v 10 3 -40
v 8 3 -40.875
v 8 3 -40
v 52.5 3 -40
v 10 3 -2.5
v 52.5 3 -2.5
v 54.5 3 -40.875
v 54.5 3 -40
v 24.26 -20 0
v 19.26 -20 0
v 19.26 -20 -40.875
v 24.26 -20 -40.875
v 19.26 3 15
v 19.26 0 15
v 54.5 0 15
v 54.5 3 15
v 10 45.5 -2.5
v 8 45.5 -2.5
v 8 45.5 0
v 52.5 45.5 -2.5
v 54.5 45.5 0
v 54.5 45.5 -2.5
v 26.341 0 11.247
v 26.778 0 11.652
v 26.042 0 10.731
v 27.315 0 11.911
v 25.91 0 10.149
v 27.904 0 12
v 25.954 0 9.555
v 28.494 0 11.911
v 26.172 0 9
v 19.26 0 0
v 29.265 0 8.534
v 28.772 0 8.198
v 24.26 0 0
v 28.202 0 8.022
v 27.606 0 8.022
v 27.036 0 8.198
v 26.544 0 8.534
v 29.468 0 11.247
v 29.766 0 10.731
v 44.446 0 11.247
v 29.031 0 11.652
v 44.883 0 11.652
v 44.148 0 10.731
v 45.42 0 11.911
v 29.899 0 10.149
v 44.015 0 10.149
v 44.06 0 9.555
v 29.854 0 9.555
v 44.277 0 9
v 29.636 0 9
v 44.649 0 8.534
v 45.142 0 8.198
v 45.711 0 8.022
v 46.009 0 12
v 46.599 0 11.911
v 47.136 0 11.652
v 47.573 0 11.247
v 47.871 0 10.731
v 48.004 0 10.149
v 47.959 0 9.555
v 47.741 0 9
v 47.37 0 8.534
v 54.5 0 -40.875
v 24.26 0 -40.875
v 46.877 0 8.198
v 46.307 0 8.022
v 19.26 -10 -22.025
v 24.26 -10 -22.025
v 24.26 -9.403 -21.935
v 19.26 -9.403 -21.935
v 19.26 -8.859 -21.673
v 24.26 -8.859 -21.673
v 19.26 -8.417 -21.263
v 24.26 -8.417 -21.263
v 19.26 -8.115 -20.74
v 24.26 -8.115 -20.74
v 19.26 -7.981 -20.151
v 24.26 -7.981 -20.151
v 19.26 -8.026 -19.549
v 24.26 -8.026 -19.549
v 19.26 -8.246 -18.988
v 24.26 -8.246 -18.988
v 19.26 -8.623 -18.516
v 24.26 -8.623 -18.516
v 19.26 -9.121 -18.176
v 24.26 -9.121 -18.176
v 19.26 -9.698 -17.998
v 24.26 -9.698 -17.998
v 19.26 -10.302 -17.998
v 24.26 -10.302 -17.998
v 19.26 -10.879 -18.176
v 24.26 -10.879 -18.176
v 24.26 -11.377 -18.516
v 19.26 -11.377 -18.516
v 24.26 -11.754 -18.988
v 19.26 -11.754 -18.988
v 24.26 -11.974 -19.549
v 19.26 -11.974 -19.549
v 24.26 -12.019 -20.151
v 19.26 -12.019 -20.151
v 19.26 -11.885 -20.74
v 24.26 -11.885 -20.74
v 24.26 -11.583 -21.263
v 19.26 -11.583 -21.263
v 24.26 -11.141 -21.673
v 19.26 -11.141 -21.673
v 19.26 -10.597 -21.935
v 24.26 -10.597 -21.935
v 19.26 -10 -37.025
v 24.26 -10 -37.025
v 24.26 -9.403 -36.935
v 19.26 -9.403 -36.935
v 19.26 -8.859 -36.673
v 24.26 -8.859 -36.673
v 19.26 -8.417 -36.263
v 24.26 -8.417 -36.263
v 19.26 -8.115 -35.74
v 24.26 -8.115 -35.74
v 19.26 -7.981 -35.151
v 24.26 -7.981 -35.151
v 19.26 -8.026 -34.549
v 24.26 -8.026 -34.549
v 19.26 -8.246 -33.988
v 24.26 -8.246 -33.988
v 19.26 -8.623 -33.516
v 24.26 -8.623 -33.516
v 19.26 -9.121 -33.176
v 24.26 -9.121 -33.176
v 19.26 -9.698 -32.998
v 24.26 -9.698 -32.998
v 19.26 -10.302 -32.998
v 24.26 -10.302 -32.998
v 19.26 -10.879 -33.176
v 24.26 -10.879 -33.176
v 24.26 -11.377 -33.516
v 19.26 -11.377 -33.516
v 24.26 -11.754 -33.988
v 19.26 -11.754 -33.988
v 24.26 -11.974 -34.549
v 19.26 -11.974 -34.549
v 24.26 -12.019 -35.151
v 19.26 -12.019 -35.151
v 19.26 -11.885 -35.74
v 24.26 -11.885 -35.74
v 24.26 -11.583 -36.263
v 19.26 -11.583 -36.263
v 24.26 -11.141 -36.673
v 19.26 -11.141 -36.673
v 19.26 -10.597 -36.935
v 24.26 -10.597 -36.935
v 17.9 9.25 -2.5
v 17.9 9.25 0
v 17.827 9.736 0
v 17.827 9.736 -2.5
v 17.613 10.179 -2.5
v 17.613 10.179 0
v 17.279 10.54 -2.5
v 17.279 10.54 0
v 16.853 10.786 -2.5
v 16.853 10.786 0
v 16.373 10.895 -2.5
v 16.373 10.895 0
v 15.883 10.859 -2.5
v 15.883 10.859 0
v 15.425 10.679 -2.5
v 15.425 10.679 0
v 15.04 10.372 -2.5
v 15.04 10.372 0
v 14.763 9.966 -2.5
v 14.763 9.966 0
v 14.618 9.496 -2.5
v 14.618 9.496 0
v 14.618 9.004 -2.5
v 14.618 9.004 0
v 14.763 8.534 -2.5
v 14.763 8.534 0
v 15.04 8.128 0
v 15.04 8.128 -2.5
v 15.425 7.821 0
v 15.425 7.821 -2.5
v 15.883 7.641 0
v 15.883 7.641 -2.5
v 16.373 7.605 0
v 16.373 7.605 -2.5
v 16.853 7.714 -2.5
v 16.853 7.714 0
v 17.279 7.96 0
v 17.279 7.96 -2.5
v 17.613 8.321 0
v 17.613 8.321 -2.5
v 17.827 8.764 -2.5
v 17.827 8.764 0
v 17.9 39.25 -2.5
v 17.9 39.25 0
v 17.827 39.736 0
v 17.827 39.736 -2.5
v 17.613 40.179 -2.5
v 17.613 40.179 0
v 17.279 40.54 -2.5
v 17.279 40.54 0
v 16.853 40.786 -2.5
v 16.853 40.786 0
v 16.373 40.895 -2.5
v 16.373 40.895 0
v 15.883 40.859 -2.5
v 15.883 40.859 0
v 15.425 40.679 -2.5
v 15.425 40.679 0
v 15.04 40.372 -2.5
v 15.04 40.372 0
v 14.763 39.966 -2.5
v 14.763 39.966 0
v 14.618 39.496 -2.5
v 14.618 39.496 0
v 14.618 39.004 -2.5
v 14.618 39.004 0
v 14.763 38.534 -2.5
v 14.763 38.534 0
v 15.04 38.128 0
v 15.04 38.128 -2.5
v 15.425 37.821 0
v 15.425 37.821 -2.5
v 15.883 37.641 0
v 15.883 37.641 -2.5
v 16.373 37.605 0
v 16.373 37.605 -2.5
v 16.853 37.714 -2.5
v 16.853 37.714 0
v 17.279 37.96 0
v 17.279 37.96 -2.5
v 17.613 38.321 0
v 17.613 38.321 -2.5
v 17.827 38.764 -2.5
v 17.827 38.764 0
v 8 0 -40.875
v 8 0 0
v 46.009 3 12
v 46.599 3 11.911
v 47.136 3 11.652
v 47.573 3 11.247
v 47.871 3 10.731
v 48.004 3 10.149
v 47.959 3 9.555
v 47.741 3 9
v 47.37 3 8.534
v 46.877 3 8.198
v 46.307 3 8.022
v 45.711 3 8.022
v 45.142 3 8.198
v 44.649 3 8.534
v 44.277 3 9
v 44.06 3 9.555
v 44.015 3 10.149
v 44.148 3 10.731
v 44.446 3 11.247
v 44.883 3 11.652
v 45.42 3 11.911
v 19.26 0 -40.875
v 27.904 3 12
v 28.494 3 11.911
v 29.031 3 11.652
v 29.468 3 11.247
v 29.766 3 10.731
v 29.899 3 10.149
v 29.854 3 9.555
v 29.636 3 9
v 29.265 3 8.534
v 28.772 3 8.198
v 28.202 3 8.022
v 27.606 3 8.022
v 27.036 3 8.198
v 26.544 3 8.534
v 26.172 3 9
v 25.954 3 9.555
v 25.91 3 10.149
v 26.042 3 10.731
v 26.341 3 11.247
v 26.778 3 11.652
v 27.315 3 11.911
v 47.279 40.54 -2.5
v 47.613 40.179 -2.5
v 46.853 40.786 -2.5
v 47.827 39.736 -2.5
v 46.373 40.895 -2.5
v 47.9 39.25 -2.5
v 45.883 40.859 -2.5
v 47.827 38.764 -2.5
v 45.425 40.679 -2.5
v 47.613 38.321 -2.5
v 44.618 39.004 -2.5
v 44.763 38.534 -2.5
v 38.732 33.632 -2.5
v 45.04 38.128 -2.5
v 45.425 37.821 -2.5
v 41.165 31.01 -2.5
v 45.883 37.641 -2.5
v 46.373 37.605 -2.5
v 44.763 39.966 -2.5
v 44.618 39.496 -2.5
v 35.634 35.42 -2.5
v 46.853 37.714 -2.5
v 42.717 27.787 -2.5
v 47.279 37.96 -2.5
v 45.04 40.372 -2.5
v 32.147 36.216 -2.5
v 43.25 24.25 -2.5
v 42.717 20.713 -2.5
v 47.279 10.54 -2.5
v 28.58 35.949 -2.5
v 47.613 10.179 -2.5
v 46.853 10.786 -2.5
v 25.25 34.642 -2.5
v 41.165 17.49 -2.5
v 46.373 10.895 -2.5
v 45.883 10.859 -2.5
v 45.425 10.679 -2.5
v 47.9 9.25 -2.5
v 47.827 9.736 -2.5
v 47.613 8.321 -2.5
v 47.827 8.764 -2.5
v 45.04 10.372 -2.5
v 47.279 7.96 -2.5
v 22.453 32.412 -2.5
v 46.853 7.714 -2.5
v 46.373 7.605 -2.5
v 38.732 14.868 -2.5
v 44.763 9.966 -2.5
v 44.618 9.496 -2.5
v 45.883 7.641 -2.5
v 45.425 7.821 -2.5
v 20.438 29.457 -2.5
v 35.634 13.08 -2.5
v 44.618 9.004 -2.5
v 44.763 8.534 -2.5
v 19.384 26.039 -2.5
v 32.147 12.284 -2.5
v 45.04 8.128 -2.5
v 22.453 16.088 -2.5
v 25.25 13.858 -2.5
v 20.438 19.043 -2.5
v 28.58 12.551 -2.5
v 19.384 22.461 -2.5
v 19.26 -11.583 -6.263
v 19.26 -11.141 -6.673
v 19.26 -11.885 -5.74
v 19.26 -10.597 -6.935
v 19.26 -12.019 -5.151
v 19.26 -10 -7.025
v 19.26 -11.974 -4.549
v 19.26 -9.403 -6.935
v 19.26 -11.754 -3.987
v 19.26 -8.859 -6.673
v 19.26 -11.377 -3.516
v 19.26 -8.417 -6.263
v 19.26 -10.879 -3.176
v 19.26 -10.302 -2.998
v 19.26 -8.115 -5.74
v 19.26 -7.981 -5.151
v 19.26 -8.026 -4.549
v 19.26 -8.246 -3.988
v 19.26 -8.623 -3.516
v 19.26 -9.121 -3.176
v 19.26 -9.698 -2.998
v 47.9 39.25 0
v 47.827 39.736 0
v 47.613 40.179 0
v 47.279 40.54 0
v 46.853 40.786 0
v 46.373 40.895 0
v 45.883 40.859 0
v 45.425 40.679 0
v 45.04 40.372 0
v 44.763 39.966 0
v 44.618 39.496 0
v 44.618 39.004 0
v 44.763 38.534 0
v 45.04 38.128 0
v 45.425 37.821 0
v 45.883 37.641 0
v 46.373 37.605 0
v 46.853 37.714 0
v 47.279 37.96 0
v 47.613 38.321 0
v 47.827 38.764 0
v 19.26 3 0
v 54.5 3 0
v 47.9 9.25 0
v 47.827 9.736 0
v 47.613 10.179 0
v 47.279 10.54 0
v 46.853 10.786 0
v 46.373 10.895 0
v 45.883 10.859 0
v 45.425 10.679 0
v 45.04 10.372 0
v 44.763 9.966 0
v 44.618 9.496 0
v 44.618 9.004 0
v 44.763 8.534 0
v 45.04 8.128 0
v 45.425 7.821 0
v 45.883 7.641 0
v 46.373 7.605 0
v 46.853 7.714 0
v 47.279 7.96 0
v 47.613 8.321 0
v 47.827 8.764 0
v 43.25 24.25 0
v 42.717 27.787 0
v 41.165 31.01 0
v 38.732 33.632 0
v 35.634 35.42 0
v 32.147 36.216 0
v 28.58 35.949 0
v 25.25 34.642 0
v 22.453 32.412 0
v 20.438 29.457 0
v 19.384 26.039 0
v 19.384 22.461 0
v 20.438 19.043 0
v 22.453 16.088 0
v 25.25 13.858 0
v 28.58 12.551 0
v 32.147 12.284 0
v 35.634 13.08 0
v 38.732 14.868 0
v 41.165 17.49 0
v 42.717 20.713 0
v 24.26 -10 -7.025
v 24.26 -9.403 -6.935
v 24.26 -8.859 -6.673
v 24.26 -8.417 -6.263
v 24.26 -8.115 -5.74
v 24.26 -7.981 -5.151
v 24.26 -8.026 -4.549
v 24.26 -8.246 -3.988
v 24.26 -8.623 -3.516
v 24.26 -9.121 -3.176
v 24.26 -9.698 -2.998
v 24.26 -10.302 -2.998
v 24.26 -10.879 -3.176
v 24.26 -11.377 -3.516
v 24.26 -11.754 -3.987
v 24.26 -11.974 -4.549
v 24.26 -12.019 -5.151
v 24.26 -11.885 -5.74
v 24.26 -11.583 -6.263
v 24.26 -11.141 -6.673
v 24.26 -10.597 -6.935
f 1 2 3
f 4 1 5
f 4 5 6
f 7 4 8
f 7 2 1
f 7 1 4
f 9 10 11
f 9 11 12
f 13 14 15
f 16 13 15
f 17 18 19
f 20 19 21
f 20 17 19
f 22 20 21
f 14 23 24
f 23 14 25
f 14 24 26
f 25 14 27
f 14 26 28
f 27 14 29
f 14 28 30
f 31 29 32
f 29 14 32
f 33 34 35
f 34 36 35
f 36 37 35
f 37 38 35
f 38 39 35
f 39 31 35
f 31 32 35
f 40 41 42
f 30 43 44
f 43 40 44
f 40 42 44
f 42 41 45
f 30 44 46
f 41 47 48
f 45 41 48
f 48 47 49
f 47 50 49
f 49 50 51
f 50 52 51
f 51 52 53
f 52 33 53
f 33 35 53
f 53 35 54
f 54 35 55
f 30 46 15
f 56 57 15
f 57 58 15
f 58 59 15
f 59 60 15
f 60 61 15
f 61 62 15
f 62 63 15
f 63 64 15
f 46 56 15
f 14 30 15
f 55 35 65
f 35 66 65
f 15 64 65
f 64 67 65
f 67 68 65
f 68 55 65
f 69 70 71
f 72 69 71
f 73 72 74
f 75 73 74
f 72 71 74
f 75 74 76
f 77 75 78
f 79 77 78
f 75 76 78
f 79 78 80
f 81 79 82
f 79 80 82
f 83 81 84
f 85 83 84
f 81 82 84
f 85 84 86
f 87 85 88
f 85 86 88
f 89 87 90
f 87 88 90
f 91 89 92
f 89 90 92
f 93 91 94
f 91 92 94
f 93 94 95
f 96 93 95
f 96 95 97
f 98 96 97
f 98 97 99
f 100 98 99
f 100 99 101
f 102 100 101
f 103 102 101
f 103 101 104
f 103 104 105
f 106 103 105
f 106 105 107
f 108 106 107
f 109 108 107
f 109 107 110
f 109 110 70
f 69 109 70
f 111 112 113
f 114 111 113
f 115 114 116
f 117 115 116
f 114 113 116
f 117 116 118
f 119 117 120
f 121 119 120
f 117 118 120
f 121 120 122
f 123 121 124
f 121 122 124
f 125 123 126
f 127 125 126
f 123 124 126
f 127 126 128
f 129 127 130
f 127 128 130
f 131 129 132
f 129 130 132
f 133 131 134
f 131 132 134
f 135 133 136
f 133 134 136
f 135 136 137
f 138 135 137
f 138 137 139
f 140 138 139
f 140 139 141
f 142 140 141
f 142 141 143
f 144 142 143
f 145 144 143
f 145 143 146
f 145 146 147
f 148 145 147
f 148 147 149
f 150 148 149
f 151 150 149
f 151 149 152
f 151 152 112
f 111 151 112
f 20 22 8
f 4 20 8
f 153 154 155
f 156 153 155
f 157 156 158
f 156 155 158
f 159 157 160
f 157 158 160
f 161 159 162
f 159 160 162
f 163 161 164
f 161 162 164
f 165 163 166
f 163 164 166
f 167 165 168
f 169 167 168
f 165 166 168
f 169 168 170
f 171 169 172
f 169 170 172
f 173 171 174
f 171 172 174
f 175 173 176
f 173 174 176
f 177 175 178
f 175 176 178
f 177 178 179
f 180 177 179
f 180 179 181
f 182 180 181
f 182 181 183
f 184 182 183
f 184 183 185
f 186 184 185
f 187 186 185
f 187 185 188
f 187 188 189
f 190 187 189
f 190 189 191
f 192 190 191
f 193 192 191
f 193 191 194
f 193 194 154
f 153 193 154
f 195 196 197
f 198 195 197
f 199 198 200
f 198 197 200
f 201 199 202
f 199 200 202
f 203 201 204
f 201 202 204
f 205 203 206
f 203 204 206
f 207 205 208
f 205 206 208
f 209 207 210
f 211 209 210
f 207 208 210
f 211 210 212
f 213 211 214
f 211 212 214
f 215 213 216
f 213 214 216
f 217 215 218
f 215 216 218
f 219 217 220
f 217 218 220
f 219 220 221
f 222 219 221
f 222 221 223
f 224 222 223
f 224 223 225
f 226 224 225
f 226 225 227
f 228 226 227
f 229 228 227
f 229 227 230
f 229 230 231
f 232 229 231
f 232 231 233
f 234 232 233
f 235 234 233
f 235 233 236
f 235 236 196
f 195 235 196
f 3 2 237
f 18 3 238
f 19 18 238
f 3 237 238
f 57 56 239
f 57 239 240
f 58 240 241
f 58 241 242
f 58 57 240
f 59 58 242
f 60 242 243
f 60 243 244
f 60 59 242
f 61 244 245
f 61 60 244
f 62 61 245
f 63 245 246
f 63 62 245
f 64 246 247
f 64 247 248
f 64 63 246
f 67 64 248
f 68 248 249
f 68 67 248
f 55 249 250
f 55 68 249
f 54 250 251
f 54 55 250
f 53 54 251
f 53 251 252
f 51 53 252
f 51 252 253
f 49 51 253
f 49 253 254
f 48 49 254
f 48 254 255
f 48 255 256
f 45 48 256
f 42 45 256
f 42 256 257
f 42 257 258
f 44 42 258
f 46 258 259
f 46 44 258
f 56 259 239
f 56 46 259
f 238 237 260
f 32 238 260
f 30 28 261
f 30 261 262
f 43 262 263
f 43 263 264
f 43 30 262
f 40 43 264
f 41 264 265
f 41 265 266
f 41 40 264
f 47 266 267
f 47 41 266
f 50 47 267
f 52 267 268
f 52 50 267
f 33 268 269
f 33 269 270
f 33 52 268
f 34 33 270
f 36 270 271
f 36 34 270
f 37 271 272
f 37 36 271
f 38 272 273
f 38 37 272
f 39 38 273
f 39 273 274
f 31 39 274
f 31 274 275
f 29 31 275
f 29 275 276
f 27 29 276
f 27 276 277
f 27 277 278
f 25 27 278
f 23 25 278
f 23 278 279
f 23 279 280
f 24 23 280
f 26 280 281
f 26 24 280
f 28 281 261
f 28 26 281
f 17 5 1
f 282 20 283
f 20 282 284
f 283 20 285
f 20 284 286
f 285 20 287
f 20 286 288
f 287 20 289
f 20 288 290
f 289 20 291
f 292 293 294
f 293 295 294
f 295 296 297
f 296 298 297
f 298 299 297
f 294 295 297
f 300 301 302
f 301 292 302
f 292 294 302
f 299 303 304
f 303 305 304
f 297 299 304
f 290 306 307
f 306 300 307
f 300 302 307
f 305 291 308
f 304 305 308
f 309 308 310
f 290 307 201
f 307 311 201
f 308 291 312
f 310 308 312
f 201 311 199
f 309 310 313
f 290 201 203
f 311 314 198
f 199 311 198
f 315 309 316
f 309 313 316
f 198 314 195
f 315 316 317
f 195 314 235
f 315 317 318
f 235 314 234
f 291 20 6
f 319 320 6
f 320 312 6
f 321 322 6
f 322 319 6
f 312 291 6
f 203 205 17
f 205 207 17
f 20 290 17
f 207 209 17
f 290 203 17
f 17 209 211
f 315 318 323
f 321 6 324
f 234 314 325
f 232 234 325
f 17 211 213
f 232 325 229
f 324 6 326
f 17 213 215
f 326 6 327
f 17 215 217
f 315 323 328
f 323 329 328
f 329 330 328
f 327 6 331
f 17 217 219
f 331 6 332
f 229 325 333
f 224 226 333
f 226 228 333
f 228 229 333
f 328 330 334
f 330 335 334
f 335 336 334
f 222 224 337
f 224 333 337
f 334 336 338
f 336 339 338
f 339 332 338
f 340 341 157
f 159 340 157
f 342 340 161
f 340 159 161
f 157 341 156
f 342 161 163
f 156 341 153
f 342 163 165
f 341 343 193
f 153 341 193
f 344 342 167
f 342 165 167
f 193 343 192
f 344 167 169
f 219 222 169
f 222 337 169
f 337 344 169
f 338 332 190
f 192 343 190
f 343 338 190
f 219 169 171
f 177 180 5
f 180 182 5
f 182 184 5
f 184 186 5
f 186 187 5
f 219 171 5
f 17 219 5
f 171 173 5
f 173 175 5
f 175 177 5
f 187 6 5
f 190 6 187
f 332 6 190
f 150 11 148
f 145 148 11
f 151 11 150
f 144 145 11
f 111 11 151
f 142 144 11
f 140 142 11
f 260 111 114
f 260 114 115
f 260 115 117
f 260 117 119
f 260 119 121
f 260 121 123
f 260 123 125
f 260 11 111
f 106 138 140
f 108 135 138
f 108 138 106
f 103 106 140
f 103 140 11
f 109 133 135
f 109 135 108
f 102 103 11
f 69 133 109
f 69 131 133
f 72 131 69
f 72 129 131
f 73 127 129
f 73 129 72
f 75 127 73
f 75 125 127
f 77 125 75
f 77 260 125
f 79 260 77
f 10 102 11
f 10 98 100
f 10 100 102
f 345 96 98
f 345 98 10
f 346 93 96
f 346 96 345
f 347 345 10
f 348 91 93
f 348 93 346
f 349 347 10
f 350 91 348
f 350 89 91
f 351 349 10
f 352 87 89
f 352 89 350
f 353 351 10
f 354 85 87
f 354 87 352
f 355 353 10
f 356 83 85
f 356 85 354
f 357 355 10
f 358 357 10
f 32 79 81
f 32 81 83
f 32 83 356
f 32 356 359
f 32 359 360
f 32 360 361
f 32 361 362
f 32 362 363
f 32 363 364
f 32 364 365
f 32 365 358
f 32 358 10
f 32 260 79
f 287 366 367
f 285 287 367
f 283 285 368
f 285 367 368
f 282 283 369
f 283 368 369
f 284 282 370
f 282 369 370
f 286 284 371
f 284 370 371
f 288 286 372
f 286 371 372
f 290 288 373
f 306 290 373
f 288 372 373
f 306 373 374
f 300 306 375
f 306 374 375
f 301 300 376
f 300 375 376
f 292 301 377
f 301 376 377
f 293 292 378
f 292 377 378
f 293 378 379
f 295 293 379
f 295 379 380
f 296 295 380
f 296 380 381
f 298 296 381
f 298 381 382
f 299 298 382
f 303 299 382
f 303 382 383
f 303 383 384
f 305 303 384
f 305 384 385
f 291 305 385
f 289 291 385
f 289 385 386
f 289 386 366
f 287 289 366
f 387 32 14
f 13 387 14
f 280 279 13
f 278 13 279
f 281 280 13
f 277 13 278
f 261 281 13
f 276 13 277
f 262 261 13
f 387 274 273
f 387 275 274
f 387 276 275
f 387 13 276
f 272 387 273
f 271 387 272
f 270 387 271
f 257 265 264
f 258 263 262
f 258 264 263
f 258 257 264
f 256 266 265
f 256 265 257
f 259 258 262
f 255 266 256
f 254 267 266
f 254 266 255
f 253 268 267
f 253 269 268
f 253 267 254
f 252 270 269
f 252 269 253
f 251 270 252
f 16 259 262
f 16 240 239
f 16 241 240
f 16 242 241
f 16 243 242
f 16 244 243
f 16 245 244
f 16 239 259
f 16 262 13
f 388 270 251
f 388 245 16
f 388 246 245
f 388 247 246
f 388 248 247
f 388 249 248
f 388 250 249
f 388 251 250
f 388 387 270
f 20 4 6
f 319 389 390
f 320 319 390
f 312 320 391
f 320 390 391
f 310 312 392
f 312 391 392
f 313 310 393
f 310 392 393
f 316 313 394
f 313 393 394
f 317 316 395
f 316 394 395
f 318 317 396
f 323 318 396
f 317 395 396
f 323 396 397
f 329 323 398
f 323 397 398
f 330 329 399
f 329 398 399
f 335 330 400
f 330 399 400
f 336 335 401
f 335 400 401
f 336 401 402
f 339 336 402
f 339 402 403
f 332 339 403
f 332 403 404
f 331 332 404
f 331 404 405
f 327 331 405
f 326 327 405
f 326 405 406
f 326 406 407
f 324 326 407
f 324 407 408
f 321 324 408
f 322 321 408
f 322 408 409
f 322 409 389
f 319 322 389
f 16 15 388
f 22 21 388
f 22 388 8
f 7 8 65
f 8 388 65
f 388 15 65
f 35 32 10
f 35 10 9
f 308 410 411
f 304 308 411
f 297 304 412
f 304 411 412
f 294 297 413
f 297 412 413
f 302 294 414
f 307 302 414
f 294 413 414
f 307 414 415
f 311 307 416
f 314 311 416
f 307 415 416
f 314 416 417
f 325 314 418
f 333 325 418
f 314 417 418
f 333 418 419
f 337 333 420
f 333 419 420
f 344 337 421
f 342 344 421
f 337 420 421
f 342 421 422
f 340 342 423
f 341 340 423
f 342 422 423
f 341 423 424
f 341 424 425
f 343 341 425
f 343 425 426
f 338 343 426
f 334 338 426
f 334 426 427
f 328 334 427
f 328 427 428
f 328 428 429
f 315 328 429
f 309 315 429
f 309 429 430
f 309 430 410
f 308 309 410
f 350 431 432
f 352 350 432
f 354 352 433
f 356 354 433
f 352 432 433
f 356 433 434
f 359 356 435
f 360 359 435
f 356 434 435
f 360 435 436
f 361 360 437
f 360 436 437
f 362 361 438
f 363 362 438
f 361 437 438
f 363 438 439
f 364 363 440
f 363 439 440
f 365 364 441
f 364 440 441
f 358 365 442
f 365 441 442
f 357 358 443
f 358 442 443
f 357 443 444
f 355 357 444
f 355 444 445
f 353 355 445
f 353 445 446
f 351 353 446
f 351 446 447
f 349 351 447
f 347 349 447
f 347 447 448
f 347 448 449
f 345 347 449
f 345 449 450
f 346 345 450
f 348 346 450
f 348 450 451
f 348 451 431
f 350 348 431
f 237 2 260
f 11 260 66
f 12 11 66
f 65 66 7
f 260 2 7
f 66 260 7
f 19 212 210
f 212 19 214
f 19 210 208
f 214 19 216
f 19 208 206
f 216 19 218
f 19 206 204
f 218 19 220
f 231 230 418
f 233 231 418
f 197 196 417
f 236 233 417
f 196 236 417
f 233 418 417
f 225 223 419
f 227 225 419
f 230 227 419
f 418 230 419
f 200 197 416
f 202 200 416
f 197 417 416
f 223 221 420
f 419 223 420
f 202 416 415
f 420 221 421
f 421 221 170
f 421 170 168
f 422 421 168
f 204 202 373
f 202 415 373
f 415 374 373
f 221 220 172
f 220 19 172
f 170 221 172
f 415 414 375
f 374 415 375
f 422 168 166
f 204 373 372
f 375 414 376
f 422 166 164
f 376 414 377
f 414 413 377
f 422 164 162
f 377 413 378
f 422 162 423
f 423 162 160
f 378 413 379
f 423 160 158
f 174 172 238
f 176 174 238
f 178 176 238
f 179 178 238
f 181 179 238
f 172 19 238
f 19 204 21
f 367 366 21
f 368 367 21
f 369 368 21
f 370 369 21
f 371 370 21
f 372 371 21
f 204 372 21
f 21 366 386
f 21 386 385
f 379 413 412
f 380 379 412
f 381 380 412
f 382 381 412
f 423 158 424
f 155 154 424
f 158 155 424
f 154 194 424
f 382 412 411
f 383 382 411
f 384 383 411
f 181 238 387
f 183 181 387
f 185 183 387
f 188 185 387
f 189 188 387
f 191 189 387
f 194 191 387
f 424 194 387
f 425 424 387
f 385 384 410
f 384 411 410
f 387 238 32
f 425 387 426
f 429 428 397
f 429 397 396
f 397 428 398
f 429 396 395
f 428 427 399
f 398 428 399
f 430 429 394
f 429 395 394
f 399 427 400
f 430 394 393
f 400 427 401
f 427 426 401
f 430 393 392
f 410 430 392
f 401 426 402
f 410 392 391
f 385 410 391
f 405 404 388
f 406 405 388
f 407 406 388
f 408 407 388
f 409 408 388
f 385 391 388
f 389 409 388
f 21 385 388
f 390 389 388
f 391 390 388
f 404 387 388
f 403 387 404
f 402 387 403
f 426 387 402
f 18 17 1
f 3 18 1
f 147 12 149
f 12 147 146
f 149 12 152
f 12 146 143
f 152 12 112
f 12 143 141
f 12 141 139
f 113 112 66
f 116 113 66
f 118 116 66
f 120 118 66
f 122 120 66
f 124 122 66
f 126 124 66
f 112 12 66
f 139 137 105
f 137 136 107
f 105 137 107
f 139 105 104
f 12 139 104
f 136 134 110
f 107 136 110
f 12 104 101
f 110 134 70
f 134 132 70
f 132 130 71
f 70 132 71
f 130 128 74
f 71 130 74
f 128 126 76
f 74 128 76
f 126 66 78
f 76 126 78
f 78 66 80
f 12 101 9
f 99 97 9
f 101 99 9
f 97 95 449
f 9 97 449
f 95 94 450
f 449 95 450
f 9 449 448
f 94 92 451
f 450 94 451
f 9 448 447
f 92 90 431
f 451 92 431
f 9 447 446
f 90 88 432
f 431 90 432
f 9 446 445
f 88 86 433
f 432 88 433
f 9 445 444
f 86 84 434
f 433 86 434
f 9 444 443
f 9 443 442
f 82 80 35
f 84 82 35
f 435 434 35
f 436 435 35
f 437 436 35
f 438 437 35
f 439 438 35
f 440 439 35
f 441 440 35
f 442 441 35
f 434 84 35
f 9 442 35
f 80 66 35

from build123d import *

# Parameters (mm, degrees)
SKETCH1_R           = 2
BOSS_EXTRUDE1_DEPTH = 3
BOSS_EXTRUDE2_DEPTH = 42.5
CUT_EXTRUDE1_DEPTH  = 77.832667384
SKETCH4_R           = 12
SKETCH4_R_2         = 1.65
CUT_EXTRUDE2_DEPTH  = 82.92227278
SKETCH6_W           = 5
SKETCH6_H           = 40.874916237
BOSS_EXTRUDE3_DEPTH = 20
SKETCH7_R           = 2.025
CUT_EXTRUDE4_DEPTH  = 69.231144603


with BuildPart() as part:
    # Sketch1 → Boss-Extrude1 (new body)
    with BuildSketch(Plane(origin=(0, 0, 0), x_dir=(1, 0, 0), z_dir=(0, 1, 0))):
        Polygon((54.5, 0.874916237), (54.5, 40.874916237), (8, 40.874916237), (8, 0), (19.259624399, 0), (19.259624399, -15), (54.5, -15), align=None)
        with Locations(Location((27.904171313, -10, 0), (0, 0, 270))):
            Circle(SKETCH1_R, mode=Mode.SUBTRACT)
        with Locations(Location((46.009358787, -10, 0), (0, 0, 270))):
            Circle(SKETCH1_R, mode=Mode.SUBTRACT)
    extrude(amount=BOSS_EXTRUDE1_DEPTH)

    # Sketch2 → Boss-Extrude2 (add)
    with BuildSketch(Plane(origin=(0, 3, 0), x_dir=(1, 0, 0), z_dir=(0, 1, 0))):
        Polygon((10, 2.5), (10, 40), (8, 40), (8, 0), (54.5, 0), (54.5, 40), (52.5, 40), (52.5, 2.5), align=None)
    extrude(amount=BOSS_EXTRUDE2_DEPTH)

    # Sketch3 → Cut-Extrude1 (cut, through all)
    with BuildSketch(Plane(origin=(54.5, 0, 0), x_dir=(0, 0, -1), z_dir=(1, 0, 0))):
        Polygon((40, 45.5), (2.5, 45.5), (40, 3), align=None)
    extrude(amount=-CUT_EXTRUDE1_DEPTH, mode=Mode.SUBTRACT)

    # Sketch4 → Cut-Extrude2 (cut, through all)
    with BuildSketch(Plane.XY):
        with Locations((31.25, 24.25)):
            Circle(SKETCH4_R)
        with Locations((16.25, 9.25)):
            Circle(SKETCH4_R_2)
        with Locations((16.25, 39.25)):
            Circle(SKETCH4_R_2)
        with Locations((46.25, 39.25)):
            Circle(SKETCH4_R_2)
        with Locations((46.25, 9.25)):
            Circle(SKETCH4_R_2)
    extrude(amount=-CUT_EXTRUDE2_DEPTH, mode=Mode.SUBTRACT)

    # Sketch6 → Boss-Extrude3 (add)
    with BuildSketch(Plane.XZ):
        with Locations((21.759624399, -20.437458119)):
            Rectangle(SKETCH6_W, SKETCH6_H)
    extrude(amount=BOSS_EXTRUDE3_DEPTH)

    # Sketch7 → Cut-Extrude4 (cut, through all)
    with BuildSketch(Plane(origin=(24.259624399, 0, 0), x_dir=(0, 0, -1), z_dir=(1, 0, 0))):
        with Locations((35, -10)):
            Circle(SKETCH7_R)
        with Locations((20, -10)):
            Circle(SKETCH7_R)
        with Locations((5, -10)):
            Circle(SKETCH7_R)
    extrude(amount=-CUT_EXTRUDE4_DEPTH, mode=Mode.SUBTRACT)


solid = part.part
